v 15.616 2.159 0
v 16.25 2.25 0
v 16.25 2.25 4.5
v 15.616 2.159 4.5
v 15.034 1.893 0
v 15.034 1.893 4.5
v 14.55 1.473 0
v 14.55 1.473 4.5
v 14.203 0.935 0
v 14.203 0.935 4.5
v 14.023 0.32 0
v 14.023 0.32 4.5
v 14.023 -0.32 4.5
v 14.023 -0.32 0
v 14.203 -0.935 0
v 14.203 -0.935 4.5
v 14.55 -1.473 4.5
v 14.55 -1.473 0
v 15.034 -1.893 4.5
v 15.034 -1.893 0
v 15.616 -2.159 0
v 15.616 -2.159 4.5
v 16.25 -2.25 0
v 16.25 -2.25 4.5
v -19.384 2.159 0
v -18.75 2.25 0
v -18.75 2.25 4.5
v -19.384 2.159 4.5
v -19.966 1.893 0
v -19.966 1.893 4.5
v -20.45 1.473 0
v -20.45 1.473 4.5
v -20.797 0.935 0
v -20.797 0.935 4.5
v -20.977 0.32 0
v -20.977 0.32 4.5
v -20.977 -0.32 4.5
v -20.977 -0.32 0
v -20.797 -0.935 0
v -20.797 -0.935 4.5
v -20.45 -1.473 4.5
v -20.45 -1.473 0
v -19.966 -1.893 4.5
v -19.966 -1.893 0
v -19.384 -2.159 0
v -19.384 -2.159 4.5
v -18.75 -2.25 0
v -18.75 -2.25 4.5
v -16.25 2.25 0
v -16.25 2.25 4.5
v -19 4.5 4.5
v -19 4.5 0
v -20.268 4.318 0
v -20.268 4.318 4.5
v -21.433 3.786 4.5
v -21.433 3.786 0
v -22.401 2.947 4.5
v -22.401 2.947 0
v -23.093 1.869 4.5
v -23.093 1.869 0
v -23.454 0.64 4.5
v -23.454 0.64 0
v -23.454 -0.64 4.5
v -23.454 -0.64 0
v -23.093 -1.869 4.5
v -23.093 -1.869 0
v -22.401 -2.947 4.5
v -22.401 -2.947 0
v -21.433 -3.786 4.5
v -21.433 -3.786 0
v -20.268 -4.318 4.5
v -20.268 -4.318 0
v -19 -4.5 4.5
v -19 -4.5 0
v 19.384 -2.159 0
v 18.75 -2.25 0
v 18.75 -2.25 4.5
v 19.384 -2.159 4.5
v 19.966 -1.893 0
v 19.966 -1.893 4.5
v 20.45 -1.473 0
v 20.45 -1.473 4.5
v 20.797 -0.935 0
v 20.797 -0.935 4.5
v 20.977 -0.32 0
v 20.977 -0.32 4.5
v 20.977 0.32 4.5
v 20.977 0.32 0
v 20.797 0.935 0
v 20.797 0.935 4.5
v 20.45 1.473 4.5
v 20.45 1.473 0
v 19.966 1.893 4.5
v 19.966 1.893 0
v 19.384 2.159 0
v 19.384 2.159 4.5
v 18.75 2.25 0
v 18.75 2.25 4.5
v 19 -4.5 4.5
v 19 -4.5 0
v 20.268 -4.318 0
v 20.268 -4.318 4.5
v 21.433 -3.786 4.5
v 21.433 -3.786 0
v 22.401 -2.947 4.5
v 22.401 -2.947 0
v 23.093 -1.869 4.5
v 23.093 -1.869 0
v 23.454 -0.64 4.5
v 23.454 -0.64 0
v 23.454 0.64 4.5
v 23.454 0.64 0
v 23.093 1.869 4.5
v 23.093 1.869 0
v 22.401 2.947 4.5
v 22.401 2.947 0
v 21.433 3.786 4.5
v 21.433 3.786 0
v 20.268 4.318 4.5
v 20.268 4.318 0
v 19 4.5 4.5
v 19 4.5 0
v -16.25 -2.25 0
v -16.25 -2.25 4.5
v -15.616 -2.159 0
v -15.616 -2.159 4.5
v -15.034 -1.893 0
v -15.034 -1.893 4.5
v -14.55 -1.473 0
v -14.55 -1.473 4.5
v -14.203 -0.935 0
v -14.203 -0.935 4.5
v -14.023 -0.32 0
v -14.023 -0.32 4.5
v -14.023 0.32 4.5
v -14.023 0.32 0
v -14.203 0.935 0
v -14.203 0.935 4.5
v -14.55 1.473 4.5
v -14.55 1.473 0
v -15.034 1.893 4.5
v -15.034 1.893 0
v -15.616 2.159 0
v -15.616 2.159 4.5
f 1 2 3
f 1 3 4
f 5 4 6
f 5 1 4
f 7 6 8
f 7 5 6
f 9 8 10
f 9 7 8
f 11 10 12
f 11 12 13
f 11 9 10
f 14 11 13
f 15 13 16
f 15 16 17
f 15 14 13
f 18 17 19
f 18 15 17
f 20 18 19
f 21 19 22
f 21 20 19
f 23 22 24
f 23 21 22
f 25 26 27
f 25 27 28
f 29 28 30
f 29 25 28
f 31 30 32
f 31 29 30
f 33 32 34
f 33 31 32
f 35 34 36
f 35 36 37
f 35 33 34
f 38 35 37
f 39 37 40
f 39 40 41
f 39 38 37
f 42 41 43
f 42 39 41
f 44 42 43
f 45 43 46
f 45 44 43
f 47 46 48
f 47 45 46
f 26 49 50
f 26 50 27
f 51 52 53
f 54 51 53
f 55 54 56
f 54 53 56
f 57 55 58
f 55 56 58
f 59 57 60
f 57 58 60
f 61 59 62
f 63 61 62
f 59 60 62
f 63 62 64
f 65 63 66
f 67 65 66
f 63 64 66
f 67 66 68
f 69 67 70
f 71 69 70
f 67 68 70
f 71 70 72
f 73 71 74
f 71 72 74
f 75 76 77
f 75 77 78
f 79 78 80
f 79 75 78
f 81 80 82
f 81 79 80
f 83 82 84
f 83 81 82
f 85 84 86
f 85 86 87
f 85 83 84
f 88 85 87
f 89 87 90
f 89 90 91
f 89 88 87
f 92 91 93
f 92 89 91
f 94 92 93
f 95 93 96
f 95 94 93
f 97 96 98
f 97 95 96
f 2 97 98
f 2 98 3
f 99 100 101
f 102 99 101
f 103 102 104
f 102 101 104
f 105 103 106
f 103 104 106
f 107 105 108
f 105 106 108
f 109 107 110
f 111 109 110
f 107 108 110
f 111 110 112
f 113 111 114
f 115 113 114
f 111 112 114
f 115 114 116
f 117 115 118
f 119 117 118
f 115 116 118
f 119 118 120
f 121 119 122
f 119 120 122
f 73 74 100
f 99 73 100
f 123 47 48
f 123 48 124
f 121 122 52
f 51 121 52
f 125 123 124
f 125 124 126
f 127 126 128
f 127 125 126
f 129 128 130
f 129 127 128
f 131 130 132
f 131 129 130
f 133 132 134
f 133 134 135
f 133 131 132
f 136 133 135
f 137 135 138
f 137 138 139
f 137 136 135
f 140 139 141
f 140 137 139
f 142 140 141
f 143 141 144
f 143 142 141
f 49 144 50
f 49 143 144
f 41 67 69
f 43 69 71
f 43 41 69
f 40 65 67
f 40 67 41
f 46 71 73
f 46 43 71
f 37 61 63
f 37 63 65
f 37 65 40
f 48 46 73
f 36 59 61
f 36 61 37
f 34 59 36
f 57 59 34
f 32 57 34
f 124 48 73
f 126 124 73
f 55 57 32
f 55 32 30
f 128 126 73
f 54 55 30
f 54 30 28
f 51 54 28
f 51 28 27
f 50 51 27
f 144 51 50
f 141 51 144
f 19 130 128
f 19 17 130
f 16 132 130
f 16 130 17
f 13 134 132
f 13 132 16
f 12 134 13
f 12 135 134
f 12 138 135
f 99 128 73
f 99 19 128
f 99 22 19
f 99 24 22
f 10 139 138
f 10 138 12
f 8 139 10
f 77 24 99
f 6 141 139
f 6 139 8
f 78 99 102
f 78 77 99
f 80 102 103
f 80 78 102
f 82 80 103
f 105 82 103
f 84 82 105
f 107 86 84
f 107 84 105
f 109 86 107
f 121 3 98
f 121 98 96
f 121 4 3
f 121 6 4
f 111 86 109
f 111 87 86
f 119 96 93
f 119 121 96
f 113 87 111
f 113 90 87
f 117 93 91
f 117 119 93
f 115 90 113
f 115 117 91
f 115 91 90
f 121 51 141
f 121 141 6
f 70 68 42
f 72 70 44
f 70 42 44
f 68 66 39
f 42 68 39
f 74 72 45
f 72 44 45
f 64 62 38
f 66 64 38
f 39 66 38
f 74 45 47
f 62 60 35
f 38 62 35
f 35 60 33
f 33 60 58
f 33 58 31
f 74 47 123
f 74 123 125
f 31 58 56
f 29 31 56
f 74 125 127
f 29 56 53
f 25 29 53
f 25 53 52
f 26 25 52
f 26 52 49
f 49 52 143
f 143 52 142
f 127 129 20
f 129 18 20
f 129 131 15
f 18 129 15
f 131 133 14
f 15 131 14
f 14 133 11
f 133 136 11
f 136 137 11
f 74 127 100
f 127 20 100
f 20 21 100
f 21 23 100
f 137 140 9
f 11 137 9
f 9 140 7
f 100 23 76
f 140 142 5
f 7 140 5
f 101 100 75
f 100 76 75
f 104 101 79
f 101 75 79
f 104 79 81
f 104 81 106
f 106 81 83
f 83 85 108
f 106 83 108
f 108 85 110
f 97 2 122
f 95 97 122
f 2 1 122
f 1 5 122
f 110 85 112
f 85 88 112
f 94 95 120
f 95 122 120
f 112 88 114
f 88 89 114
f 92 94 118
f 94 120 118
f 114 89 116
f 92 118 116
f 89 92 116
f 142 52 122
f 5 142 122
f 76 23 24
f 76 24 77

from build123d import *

# Parameters (mm, degrees)
SALIENTE_EXTRUIR2_DEPTH = 4.5


with BuildPart() as part:
    # Croquis1 → Saliente-Extruir2 (new body)
    with BuildSketch(Plane.XY):
        with BuildLine():
            Line((19, 4.5), (-19, 4.5))
            ThreePointArc((-19, 4.5), (-23.5, 0), (-19, -4.5))
            Line((-19, -4.5), (19, -4.5))
            ThreePointArc((19, -4.5), (23.5, 0), (19, 4.5))
        make_face()
        with BuildLine():
            Line((18.75, 2.25), (16.25, 2.25))
            ThreePointArc((16.25, 2.25), (14, 0), (16.25, -2.25))
            Line((16.25, -2.25), (18.75, -2.25))
            ThreePointArc((18.75, -2.25), (21, 0), (18.75, 2.25))
        make_face(mode=Mode.SUBTRACT)
        with BuildLine():
            Line((-16.25, 2.25), (-18.75, 2.25))
            ThreePointArc((-18.75, 2.25), (-21, 0), (-18.75, -2.25))
            Line((-18.75, -2.25), (-16.25, -2.25))
            ThreePointArc((-16.25, -2.25), (-14, 0), (-16.25, 2.25))
        make_face(mode=Mode.SUBTRACT)
    extrude(amount=SALIENTE_EXTRUIR2_DEPTH)


solid = part.part
